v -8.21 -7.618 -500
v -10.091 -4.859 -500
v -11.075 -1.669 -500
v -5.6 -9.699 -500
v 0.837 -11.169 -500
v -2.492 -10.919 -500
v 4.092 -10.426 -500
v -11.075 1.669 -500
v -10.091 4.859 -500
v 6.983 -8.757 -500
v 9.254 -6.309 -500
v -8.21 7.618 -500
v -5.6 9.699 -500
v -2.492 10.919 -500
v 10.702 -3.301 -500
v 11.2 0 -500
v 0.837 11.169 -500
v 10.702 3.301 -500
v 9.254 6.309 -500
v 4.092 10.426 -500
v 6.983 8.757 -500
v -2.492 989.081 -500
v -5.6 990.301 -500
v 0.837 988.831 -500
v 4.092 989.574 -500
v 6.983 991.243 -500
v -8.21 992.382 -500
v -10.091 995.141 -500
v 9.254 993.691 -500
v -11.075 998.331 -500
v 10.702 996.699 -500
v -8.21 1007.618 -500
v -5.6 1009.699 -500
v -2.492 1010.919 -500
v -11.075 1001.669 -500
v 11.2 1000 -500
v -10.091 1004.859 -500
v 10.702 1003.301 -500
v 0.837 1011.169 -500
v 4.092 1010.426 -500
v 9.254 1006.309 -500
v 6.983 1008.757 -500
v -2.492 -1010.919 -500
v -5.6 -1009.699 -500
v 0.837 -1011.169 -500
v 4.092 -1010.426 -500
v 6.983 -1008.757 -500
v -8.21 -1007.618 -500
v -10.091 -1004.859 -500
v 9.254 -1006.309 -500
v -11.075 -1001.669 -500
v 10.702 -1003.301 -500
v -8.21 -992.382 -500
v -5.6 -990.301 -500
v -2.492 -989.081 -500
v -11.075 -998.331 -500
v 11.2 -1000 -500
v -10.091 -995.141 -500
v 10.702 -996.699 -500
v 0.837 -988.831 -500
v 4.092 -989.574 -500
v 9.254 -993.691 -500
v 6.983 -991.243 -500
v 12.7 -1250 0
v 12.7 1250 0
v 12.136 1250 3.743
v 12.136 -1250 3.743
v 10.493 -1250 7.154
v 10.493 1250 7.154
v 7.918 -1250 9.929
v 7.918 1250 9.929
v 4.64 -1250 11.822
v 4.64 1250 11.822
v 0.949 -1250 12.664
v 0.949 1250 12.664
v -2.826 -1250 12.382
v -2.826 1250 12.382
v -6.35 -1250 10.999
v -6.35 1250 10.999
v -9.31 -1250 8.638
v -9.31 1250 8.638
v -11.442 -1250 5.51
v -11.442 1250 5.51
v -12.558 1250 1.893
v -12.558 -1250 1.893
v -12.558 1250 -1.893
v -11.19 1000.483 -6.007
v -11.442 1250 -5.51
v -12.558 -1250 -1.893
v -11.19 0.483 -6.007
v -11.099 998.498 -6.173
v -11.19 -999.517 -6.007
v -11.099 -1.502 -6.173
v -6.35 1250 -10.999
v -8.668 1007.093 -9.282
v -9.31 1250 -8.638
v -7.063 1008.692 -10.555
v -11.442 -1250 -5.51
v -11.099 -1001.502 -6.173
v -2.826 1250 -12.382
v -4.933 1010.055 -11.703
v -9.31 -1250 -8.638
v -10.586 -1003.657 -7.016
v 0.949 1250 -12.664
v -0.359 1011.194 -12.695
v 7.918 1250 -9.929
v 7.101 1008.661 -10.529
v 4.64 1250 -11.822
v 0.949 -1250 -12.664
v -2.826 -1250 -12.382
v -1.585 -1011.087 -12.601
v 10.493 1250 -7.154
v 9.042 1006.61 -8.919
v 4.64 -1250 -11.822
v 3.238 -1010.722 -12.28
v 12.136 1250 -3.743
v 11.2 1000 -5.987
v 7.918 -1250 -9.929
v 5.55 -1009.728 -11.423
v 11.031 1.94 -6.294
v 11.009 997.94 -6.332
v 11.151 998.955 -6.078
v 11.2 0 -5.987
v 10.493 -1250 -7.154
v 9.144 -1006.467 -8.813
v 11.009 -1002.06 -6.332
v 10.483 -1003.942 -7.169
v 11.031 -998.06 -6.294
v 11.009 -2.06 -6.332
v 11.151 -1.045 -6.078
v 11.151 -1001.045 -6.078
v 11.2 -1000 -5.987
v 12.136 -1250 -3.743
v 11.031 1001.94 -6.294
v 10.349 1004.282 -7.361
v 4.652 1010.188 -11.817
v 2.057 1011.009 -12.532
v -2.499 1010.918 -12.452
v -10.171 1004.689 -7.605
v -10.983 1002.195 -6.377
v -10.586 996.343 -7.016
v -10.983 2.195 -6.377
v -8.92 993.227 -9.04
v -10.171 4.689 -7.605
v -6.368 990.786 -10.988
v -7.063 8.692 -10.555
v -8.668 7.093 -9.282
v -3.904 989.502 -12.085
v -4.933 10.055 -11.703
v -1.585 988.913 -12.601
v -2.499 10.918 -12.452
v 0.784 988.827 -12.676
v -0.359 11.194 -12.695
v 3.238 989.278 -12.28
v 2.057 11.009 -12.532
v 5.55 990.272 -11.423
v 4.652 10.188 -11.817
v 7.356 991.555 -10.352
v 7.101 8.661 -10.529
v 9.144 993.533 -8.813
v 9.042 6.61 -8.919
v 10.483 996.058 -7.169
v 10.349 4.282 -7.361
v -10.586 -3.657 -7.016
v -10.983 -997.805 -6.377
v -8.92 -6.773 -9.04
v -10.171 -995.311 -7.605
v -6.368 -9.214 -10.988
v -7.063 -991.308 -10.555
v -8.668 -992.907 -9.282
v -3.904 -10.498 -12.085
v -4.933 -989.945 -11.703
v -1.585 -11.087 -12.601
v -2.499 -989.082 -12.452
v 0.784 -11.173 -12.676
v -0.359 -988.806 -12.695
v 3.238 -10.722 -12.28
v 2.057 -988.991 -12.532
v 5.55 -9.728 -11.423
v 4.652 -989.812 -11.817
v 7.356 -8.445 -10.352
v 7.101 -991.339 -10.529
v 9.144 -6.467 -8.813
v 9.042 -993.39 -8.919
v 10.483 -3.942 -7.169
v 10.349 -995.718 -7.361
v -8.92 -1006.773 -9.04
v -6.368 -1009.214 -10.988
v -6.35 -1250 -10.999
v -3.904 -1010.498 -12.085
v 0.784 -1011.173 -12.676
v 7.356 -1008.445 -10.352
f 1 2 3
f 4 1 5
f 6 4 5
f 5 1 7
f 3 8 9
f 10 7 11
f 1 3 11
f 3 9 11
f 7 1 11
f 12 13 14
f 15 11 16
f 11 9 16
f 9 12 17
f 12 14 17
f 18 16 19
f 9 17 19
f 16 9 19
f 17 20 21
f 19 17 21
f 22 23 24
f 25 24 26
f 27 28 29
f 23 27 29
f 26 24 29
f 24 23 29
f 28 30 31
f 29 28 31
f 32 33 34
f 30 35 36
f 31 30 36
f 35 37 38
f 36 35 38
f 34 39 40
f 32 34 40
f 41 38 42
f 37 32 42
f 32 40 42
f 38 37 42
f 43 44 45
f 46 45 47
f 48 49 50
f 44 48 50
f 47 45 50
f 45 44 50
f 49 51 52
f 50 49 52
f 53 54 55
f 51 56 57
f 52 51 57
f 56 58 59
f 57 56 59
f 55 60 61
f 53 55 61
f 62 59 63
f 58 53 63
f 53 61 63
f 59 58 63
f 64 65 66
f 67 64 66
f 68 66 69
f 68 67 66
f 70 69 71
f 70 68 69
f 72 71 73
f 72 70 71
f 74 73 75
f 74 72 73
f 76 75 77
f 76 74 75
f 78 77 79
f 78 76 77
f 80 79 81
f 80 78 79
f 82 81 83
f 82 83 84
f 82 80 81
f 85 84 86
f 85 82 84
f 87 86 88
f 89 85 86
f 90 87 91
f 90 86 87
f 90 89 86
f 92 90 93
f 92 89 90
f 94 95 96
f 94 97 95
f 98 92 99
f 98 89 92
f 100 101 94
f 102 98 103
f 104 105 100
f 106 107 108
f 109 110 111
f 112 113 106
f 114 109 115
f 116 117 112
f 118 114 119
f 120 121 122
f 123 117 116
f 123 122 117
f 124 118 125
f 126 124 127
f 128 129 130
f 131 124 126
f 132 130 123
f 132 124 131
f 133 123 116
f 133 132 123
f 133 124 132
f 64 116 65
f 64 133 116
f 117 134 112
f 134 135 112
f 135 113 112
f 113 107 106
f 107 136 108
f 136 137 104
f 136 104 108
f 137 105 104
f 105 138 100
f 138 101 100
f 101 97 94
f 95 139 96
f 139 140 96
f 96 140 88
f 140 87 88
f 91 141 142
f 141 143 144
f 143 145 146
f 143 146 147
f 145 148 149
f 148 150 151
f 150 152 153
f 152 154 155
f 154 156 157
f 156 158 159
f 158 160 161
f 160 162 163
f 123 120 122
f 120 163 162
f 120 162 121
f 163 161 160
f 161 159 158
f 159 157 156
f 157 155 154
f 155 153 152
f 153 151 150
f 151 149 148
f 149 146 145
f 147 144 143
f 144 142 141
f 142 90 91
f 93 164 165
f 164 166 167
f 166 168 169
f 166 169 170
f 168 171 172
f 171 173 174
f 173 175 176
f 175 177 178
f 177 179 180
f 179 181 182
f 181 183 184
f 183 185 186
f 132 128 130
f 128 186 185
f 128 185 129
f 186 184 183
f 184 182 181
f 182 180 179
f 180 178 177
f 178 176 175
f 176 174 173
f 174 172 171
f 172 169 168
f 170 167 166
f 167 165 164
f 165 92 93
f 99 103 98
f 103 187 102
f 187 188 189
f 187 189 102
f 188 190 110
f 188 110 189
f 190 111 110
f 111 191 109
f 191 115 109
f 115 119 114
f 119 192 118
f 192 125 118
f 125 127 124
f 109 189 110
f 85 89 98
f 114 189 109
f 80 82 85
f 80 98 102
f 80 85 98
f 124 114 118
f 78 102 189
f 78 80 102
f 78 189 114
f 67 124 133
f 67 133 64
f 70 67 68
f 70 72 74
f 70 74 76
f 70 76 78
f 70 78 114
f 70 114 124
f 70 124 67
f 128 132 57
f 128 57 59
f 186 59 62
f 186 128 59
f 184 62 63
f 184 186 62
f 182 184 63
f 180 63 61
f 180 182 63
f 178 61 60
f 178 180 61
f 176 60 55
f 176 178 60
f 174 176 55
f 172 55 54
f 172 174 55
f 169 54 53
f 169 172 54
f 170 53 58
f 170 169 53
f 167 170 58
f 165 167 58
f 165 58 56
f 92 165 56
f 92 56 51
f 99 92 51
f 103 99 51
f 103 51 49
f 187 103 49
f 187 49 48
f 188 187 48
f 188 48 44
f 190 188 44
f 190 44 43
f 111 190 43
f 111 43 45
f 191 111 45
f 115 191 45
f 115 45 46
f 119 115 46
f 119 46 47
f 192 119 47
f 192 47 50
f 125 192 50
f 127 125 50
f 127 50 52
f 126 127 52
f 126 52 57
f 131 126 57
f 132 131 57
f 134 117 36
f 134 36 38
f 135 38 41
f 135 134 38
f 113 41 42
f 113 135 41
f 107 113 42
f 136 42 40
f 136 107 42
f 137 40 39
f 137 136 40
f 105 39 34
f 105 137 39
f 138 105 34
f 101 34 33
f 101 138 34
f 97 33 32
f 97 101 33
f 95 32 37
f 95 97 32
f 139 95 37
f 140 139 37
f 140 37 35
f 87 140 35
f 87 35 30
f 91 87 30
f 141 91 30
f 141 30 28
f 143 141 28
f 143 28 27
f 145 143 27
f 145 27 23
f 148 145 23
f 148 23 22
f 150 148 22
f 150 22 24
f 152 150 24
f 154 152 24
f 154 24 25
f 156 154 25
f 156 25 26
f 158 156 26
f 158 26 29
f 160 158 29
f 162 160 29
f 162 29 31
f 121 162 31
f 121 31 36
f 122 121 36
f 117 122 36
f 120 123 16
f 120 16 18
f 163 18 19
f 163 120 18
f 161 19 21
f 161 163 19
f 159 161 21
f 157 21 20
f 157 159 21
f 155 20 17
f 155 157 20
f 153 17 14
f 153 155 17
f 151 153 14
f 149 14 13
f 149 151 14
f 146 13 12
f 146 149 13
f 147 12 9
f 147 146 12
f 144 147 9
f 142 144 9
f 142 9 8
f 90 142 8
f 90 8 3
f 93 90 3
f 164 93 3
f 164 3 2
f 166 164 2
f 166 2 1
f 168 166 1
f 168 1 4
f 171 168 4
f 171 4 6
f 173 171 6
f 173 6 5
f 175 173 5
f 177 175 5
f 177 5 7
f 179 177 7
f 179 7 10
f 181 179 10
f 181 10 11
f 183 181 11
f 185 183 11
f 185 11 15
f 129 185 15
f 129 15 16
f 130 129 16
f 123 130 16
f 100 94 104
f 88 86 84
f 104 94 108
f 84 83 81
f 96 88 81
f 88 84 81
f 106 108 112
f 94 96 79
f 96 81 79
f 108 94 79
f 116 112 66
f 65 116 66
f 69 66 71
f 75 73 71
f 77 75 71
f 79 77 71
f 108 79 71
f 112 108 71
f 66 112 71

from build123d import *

# Parameters (mm, degrees)
F0_R     = 12.7
F1_DEPTH = 1250
F2_R     = 11.2
F3_DEPTH = 500


with BuildPart() as f1:
    # F0 (on Front) → F1 (new body, symmetric)
    with BuildSketch(Plane.XZ):
        Circle(F0_R)
    extrude(amount=F1_DEPTH, both=True)

    # F2 (on Top) → F3 (join)
    with BuildSketch(Plane.XY):
        Circle(F2_R)
        with Locations((0, -1000)):
            Circle(F2_R)
        with Locations((0, 1000)):
            Circle(F2_R)
    extrude(amount=-F3_DEPTH)


solid = f1.part
